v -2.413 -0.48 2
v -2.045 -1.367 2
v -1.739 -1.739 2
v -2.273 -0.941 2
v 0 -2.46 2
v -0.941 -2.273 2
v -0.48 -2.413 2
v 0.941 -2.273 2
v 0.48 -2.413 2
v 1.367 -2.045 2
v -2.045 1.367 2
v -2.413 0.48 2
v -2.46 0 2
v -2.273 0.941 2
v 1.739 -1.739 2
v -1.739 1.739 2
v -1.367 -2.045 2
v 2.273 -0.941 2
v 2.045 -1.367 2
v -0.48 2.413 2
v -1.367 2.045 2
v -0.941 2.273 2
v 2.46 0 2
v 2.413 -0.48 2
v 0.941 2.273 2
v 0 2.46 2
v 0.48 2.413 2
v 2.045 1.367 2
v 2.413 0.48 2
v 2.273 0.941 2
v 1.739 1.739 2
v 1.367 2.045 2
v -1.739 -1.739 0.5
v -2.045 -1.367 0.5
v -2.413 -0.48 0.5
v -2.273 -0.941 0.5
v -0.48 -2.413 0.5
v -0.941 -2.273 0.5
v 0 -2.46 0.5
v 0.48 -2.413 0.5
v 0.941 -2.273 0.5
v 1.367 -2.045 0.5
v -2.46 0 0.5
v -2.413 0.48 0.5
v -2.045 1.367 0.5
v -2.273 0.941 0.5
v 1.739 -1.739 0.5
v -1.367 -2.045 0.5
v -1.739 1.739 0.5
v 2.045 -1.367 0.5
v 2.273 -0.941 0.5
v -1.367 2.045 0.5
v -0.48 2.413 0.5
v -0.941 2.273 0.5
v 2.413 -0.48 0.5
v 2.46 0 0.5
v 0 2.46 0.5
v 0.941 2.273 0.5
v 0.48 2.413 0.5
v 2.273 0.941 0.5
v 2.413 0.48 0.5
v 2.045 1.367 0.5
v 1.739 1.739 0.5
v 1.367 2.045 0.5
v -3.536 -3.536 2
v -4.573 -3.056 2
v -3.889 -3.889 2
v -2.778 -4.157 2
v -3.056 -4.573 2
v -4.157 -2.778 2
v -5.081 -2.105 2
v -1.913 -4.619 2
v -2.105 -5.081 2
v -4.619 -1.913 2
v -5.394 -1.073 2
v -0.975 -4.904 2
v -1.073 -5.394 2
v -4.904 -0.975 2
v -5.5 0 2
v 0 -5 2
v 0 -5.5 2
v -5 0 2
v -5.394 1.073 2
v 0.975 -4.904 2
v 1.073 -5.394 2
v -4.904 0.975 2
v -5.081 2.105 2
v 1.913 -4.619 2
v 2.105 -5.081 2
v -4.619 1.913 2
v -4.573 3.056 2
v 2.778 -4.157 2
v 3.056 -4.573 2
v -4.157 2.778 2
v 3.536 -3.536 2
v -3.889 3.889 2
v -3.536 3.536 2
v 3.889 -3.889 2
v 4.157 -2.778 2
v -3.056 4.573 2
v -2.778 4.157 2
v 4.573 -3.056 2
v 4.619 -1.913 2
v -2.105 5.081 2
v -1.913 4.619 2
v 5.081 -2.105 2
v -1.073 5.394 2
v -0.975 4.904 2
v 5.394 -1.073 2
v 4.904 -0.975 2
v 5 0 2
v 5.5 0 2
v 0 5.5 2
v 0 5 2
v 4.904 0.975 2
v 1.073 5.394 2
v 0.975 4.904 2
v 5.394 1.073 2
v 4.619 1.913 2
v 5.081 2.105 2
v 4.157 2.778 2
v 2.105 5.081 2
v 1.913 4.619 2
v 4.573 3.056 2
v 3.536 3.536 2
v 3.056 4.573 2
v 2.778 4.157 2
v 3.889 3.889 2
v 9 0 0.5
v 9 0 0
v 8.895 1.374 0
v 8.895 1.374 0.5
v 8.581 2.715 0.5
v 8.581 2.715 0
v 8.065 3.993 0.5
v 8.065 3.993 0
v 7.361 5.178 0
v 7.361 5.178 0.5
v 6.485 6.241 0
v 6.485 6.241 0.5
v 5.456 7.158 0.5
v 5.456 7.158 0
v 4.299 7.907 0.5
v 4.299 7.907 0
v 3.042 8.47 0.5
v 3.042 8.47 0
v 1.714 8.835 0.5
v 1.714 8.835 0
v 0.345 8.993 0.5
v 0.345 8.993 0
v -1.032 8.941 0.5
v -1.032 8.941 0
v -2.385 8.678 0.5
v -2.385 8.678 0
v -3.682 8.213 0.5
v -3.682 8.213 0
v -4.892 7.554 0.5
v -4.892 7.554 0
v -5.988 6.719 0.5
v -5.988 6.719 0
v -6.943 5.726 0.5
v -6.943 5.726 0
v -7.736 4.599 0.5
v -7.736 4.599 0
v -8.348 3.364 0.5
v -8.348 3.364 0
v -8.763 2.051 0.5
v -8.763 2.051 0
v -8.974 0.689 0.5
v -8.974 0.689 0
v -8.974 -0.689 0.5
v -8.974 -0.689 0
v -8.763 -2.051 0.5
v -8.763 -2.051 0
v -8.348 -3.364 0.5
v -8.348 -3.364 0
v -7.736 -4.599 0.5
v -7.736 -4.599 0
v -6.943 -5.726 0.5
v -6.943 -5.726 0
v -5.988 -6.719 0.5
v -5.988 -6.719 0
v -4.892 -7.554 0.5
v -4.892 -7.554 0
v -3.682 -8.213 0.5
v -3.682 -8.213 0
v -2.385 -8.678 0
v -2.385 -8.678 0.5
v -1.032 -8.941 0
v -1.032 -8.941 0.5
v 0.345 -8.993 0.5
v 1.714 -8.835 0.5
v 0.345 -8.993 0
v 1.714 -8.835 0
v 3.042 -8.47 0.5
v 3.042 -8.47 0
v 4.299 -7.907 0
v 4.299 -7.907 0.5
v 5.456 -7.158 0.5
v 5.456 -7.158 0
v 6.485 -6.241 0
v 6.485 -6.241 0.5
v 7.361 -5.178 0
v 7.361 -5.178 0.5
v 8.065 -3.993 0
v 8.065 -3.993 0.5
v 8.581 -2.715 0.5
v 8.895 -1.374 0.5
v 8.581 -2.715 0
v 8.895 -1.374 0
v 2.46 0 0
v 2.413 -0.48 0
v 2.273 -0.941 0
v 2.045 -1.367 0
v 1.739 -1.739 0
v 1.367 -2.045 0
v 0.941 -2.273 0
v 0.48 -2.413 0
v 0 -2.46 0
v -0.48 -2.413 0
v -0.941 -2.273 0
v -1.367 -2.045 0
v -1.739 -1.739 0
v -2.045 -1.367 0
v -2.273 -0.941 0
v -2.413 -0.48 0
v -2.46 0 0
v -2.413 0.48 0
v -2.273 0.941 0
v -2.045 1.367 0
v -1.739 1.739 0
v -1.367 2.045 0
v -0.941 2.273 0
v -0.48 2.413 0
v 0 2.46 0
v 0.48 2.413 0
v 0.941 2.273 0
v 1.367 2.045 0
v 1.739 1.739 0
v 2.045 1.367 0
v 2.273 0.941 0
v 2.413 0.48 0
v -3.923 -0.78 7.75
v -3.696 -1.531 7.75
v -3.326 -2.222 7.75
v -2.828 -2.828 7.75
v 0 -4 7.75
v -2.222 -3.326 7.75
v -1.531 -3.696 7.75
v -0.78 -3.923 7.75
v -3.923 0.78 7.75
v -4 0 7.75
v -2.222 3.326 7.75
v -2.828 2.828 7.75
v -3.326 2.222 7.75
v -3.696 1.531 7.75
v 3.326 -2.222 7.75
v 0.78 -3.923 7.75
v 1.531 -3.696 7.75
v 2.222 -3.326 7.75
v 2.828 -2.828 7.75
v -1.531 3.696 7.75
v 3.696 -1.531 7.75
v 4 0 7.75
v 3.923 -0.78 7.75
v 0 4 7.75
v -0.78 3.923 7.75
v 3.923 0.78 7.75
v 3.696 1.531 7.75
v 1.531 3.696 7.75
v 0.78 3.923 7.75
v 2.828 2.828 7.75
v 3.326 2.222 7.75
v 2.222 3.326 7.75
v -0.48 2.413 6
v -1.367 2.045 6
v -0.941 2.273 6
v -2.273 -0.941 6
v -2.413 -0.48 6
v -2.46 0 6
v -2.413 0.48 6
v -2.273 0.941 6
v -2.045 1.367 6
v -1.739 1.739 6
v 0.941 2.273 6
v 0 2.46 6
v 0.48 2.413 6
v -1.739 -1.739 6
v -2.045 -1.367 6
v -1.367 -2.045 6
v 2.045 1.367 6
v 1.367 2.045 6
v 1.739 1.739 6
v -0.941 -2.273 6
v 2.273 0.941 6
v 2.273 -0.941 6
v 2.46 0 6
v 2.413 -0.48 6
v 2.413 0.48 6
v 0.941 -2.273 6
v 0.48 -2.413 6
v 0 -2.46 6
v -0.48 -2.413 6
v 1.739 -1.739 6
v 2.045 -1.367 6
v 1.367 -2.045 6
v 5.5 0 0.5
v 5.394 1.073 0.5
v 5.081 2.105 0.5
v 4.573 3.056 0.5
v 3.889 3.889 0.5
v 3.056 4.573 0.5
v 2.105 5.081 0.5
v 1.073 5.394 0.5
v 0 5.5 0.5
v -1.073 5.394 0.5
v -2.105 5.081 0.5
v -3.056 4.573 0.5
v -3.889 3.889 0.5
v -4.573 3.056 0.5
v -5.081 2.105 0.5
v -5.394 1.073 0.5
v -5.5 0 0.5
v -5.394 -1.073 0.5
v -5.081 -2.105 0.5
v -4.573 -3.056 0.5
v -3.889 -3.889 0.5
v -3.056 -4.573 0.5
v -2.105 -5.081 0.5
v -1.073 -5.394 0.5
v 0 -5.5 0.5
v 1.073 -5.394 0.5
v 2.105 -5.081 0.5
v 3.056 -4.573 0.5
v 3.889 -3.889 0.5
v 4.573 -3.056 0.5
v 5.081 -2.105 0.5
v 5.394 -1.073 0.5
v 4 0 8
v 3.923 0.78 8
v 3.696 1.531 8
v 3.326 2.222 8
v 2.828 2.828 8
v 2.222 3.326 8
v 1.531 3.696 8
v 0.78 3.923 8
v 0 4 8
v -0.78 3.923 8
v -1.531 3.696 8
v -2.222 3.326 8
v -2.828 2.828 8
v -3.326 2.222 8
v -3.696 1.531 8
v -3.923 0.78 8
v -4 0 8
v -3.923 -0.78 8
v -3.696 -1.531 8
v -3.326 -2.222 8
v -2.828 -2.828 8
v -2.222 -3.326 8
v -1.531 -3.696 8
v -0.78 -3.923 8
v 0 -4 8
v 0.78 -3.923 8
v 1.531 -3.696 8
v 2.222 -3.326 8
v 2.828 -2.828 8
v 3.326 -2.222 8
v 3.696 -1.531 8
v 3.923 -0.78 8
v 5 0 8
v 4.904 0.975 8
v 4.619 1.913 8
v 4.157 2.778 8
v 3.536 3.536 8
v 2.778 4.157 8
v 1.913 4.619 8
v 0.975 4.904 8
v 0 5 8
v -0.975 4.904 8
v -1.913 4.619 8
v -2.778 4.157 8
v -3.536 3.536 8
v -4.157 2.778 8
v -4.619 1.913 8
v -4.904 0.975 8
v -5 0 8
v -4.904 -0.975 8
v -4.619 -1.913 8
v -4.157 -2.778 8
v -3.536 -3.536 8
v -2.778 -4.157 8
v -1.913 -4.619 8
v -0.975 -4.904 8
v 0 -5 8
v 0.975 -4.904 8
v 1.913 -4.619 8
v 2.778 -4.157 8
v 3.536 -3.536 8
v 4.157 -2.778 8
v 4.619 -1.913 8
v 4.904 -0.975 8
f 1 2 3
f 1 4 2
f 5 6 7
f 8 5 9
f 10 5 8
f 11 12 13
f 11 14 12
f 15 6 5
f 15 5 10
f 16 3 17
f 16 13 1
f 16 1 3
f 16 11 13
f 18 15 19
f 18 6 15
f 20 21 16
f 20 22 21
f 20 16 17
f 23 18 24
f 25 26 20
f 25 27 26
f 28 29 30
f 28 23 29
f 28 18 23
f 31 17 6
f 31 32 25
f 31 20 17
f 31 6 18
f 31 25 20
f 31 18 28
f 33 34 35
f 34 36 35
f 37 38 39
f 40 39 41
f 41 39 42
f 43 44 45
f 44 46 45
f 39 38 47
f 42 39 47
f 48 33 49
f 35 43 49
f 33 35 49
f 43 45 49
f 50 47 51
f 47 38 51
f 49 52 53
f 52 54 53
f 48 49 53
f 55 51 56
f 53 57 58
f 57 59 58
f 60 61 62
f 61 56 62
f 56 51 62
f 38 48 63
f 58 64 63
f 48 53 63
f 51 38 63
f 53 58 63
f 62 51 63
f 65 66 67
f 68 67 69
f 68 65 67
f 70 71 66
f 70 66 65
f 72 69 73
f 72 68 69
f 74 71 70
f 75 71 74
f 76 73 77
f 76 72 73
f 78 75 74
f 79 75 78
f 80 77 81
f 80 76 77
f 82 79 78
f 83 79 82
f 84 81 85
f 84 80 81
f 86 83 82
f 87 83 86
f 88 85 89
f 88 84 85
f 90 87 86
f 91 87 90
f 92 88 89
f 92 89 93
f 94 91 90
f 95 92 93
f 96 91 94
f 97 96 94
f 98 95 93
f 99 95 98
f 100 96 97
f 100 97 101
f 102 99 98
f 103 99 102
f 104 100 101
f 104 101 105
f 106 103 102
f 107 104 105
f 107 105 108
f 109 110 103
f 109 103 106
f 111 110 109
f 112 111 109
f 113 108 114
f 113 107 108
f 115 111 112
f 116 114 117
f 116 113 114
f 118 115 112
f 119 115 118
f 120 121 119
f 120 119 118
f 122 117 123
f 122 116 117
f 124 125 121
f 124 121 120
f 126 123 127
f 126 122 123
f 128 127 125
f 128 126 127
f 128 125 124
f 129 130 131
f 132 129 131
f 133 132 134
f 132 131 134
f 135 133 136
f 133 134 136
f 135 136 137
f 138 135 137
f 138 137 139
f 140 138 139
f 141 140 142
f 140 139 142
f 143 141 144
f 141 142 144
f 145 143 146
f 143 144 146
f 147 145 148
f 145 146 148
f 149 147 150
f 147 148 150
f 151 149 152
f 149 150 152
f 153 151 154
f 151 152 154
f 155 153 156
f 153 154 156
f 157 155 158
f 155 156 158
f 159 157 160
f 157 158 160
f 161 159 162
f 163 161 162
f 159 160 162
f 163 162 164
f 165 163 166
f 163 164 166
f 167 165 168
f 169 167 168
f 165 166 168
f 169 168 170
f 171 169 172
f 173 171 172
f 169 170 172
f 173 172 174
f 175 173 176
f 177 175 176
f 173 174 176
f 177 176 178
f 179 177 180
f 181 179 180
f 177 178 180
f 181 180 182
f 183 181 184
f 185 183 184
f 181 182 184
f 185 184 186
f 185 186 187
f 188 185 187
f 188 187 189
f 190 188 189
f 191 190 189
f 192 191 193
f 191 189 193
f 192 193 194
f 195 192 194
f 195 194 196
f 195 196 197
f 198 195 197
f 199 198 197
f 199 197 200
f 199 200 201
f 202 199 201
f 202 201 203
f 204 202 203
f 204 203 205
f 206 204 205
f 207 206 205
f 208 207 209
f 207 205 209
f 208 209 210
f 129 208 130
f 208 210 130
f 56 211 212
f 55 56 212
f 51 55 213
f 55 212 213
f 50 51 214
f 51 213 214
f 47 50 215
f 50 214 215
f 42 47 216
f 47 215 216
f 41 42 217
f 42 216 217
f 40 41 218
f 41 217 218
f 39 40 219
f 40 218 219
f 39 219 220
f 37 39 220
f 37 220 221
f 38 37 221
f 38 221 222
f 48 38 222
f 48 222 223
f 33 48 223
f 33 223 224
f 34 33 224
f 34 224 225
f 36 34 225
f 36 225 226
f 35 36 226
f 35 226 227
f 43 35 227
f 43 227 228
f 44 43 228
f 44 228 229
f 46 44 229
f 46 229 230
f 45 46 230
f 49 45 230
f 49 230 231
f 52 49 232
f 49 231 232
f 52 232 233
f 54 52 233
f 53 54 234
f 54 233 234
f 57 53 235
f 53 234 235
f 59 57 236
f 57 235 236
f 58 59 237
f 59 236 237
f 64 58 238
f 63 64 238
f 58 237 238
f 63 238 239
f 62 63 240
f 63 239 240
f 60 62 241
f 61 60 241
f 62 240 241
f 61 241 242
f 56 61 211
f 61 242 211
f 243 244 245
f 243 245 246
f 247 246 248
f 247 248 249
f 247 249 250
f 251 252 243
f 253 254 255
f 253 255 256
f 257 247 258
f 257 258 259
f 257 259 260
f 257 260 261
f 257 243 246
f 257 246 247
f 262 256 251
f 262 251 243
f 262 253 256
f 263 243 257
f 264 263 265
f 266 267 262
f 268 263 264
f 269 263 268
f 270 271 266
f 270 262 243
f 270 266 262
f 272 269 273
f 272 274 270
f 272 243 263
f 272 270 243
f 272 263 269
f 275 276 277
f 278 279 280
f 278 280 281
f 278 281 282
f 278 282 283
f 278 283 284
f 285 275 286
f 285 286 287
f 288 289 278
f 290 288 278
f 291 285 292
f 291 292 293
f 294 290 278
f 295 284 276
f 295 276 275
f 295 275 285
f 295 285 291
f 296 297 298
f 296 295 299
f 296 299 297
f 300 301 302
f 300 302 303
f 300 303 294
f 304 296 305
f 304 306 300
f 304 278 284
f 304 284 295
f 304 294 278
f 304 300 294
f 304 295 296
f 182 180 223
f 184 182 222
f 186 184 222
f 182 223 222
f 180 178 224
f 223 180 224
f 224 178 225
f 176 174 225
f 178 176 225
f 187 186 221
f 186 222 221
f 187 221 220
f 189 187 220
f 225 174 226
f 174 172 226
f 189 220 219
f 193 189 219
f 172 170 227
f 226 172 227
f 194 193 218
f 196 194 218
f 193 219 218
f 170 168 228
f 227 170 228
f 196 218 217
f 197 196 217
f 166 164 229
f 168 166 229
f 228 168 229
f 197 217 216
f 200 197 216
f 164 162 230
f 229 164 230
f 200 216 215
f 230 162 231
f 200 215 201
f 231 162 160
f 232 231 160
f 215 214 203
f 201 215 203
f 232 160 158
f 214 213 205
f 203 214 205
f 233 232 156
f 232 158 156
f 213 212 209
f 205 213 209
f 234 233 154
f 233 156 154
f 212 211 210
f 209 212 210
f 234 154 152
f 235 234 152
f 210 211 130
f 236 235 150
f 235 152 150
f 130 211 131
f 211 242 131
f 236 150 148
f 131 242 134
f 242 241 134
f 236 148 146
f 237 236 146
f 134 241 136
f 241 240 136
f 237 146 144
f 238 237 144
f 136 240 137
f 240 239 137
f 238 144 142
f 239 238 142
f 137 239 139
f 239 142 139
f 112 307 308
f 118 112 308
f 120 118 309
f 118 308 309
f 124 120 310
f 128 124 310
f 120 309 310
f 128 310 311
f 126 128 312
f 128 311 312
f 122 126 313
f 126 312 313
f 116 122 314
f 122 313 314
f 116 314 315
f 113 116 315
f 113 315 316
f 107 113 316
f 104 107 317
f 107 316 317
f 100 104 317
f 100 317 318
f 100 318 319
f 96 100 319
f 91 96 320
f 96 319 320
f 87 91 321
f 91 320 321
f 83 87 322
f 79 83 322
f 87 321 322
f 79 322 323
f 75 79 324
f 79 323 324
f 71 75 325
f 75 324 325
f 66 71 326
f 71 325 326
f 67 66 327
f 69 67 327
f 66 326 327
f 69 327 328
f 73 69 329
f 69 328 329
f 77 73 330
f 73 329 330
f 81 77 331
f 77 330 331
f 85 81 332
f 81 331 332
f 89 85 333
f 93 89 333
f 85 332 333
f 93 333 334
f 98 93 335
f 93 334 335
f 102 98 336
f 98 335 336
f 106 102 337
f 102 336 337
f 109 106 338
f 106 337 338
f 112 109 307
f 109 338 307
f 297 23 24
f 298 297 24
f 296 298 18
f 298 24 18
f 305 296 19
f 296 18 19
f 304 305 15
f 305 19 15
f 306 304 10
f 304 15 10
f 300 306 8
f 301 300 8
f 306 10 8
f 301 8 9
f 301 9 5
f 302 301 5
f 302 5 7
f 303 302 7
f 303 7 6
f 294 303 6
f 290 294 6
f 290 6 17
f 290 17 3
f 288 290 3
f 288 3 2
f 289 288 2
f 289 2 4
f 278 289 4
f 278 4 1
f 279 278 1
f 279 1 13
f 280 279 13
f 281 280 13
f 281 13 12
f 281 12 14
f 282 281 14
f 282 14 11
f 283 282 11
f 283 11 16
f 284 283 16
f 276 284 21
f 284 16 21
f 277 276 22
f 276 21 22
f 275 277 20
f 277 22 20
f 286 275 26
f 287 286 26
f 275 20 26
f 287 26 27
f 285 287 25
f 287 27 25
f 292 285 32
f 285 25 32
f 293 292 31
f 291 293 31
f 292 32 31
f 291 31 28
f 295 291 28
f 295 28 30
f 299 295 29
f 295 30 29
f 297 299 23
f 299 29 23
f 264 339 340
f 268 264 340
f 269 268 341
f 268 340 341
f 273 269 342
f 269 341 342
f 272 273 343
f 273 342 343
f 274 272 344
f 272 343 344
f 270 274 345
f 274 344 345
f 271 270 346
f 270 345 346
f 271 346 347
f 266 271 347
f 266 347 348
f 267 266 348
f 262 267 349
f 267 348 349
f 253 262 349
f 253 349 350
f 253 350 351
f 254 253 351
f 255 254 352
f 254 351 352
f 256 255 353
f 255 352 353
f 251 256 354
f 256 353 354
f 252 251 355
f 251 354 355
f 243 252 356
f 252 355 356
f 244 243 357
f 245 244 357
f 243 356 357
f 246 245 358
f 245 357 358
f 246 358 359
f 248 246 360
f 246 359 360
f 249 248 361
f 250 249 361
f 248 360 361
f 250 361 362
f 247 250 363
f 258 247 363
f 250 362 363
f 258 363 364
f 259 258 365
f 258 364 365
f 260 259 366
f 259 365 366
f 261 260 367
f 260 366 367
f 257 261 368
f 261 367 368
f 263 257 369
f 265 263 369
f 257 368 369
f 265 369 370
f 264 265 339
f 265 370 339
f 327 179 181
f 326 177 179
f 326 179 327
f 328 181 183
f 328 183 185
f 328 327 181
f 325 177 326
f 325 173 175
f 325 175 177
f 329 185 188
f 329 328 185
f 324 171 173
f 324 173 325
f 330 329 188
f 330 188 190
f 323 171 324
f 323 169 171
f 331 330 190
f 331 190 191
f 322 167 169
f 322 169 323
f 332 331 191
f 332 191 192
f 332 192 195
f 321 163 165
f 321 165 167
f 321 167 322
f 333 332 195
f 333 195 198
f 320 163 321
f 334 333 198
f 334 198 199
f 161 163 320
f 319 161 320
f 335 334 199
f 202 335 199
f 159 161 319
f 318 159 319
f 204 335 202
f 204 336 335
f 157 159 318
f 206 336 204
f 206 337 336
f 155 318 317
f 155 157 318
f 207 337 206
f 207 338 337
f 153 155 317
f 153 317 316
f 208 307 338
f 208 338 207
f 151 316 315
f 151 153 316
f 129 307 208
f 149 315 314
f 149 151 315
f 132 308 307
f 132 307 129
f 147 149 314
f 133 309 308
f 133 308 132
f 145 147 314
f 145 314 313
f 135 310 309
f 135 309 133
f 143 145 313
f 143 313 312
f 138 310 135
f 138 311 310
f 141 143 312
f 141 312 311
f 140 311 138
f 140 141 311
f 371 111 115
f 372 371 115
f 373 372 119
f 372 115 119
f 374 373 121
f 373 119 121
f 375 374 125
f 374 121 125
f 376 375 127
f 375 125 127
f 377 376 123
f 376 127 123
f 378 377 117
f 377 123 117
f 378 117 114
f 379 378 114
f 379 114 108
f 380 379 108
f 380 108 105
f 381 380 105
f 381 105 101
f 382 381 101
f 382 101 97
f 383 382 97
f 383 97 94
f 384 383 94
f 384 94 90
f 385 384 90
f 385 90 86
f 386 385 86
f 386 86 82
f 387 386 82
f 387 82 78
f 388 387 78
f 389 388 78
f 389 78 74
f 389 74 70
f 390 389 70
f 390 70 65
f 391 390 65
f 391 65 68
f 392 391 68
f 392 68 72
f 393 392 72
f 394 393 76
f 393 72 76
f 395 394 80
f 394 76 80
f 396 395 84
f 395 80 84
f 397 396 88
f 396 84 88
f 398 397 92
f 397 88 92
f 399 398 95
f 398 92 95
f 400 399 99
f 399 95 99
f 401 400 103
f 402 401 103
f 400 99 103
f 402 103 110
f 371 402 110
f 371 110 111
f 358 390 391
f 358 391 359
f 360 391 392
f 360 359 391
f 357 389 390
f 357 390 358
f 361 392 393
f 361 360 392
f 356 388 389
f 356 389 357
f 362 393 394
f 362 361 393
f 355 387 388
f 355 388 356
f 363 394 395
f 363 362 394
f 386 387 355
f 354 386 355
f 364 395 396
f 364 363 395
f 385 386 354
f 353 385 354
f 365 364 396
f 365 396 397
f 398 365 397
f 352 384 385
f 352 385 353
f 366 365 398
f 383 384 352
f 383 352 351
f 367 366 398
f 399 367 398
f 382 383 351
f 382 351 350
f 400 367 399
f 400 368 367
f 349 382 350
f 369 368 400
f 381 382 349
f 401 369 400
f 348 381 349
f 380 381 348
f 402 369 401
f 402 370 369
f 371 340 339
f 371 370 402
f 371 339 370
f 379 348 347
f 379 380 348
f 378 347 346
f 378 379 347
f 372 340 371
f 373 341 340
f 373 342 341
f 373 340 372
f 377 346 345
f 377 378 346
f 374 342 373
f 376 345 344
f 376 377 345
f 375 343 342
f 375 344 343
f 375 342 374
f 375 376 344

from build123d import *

# Parameters (mm, degrees)
F0_R      = 9
F1_DEPTH  = 0.5
F2_R      = 5
F3_DEPTH  = 8
F4_R      = 2.46
F5_DEPTH  = 6
F6_R      = 5
F7_DEPTH  = 0.5
F8_R      = 5.5
F9_DEPTH  = 1.5
F10_R     = 4
F11_DEPTH = 0.25


with BuildPart() as f1:
    # F0 (on Top) → F1 (new body)
    with BuildSketch(Plane.XY):
        Circle(F0_R)
    extrude(amount=F1_DEPTH)

    # F2 (on face) → F3 (join)
    with BuildSketch(Plane.XY.offset(0.5)):
        Circle(F2_R)
    extrude(amount=F3_DEPTH)

    # F4 (on face) → F5 (cut)
    with BuildSketch(Plane(origin=(0, 0, 0), x_dir=(1, 0, 0), z_dir=(0, 0, -1))):
        Circle(F4_R)
    extrude(amount=-F5_DEPTH, mode=Mode.SUBTRACT)

    # F6 (on face) → F7 (cut)
    with BuildSketch(Plane.XY.offset(8.5)):
        Circle(F6_R)
    extrude(amount=-F7_DEPTH, mode=Mode.SUBTRACT)

    # F8 (on face) → F9 (join)
    with BuildSketch(Plane.XY.offset(0.5)):
        Circle(F8_R)
    extrude(amount=F9_DEPTH)

    # F10 (on face) → F11 (cut)
    with BuildSketch(Plane.XY.offset(8)):
        Circle(F10_R)
    extrude(amount=-F11_DEPTH, mode=Mode.SUBTRACT)


solid = f1.part
